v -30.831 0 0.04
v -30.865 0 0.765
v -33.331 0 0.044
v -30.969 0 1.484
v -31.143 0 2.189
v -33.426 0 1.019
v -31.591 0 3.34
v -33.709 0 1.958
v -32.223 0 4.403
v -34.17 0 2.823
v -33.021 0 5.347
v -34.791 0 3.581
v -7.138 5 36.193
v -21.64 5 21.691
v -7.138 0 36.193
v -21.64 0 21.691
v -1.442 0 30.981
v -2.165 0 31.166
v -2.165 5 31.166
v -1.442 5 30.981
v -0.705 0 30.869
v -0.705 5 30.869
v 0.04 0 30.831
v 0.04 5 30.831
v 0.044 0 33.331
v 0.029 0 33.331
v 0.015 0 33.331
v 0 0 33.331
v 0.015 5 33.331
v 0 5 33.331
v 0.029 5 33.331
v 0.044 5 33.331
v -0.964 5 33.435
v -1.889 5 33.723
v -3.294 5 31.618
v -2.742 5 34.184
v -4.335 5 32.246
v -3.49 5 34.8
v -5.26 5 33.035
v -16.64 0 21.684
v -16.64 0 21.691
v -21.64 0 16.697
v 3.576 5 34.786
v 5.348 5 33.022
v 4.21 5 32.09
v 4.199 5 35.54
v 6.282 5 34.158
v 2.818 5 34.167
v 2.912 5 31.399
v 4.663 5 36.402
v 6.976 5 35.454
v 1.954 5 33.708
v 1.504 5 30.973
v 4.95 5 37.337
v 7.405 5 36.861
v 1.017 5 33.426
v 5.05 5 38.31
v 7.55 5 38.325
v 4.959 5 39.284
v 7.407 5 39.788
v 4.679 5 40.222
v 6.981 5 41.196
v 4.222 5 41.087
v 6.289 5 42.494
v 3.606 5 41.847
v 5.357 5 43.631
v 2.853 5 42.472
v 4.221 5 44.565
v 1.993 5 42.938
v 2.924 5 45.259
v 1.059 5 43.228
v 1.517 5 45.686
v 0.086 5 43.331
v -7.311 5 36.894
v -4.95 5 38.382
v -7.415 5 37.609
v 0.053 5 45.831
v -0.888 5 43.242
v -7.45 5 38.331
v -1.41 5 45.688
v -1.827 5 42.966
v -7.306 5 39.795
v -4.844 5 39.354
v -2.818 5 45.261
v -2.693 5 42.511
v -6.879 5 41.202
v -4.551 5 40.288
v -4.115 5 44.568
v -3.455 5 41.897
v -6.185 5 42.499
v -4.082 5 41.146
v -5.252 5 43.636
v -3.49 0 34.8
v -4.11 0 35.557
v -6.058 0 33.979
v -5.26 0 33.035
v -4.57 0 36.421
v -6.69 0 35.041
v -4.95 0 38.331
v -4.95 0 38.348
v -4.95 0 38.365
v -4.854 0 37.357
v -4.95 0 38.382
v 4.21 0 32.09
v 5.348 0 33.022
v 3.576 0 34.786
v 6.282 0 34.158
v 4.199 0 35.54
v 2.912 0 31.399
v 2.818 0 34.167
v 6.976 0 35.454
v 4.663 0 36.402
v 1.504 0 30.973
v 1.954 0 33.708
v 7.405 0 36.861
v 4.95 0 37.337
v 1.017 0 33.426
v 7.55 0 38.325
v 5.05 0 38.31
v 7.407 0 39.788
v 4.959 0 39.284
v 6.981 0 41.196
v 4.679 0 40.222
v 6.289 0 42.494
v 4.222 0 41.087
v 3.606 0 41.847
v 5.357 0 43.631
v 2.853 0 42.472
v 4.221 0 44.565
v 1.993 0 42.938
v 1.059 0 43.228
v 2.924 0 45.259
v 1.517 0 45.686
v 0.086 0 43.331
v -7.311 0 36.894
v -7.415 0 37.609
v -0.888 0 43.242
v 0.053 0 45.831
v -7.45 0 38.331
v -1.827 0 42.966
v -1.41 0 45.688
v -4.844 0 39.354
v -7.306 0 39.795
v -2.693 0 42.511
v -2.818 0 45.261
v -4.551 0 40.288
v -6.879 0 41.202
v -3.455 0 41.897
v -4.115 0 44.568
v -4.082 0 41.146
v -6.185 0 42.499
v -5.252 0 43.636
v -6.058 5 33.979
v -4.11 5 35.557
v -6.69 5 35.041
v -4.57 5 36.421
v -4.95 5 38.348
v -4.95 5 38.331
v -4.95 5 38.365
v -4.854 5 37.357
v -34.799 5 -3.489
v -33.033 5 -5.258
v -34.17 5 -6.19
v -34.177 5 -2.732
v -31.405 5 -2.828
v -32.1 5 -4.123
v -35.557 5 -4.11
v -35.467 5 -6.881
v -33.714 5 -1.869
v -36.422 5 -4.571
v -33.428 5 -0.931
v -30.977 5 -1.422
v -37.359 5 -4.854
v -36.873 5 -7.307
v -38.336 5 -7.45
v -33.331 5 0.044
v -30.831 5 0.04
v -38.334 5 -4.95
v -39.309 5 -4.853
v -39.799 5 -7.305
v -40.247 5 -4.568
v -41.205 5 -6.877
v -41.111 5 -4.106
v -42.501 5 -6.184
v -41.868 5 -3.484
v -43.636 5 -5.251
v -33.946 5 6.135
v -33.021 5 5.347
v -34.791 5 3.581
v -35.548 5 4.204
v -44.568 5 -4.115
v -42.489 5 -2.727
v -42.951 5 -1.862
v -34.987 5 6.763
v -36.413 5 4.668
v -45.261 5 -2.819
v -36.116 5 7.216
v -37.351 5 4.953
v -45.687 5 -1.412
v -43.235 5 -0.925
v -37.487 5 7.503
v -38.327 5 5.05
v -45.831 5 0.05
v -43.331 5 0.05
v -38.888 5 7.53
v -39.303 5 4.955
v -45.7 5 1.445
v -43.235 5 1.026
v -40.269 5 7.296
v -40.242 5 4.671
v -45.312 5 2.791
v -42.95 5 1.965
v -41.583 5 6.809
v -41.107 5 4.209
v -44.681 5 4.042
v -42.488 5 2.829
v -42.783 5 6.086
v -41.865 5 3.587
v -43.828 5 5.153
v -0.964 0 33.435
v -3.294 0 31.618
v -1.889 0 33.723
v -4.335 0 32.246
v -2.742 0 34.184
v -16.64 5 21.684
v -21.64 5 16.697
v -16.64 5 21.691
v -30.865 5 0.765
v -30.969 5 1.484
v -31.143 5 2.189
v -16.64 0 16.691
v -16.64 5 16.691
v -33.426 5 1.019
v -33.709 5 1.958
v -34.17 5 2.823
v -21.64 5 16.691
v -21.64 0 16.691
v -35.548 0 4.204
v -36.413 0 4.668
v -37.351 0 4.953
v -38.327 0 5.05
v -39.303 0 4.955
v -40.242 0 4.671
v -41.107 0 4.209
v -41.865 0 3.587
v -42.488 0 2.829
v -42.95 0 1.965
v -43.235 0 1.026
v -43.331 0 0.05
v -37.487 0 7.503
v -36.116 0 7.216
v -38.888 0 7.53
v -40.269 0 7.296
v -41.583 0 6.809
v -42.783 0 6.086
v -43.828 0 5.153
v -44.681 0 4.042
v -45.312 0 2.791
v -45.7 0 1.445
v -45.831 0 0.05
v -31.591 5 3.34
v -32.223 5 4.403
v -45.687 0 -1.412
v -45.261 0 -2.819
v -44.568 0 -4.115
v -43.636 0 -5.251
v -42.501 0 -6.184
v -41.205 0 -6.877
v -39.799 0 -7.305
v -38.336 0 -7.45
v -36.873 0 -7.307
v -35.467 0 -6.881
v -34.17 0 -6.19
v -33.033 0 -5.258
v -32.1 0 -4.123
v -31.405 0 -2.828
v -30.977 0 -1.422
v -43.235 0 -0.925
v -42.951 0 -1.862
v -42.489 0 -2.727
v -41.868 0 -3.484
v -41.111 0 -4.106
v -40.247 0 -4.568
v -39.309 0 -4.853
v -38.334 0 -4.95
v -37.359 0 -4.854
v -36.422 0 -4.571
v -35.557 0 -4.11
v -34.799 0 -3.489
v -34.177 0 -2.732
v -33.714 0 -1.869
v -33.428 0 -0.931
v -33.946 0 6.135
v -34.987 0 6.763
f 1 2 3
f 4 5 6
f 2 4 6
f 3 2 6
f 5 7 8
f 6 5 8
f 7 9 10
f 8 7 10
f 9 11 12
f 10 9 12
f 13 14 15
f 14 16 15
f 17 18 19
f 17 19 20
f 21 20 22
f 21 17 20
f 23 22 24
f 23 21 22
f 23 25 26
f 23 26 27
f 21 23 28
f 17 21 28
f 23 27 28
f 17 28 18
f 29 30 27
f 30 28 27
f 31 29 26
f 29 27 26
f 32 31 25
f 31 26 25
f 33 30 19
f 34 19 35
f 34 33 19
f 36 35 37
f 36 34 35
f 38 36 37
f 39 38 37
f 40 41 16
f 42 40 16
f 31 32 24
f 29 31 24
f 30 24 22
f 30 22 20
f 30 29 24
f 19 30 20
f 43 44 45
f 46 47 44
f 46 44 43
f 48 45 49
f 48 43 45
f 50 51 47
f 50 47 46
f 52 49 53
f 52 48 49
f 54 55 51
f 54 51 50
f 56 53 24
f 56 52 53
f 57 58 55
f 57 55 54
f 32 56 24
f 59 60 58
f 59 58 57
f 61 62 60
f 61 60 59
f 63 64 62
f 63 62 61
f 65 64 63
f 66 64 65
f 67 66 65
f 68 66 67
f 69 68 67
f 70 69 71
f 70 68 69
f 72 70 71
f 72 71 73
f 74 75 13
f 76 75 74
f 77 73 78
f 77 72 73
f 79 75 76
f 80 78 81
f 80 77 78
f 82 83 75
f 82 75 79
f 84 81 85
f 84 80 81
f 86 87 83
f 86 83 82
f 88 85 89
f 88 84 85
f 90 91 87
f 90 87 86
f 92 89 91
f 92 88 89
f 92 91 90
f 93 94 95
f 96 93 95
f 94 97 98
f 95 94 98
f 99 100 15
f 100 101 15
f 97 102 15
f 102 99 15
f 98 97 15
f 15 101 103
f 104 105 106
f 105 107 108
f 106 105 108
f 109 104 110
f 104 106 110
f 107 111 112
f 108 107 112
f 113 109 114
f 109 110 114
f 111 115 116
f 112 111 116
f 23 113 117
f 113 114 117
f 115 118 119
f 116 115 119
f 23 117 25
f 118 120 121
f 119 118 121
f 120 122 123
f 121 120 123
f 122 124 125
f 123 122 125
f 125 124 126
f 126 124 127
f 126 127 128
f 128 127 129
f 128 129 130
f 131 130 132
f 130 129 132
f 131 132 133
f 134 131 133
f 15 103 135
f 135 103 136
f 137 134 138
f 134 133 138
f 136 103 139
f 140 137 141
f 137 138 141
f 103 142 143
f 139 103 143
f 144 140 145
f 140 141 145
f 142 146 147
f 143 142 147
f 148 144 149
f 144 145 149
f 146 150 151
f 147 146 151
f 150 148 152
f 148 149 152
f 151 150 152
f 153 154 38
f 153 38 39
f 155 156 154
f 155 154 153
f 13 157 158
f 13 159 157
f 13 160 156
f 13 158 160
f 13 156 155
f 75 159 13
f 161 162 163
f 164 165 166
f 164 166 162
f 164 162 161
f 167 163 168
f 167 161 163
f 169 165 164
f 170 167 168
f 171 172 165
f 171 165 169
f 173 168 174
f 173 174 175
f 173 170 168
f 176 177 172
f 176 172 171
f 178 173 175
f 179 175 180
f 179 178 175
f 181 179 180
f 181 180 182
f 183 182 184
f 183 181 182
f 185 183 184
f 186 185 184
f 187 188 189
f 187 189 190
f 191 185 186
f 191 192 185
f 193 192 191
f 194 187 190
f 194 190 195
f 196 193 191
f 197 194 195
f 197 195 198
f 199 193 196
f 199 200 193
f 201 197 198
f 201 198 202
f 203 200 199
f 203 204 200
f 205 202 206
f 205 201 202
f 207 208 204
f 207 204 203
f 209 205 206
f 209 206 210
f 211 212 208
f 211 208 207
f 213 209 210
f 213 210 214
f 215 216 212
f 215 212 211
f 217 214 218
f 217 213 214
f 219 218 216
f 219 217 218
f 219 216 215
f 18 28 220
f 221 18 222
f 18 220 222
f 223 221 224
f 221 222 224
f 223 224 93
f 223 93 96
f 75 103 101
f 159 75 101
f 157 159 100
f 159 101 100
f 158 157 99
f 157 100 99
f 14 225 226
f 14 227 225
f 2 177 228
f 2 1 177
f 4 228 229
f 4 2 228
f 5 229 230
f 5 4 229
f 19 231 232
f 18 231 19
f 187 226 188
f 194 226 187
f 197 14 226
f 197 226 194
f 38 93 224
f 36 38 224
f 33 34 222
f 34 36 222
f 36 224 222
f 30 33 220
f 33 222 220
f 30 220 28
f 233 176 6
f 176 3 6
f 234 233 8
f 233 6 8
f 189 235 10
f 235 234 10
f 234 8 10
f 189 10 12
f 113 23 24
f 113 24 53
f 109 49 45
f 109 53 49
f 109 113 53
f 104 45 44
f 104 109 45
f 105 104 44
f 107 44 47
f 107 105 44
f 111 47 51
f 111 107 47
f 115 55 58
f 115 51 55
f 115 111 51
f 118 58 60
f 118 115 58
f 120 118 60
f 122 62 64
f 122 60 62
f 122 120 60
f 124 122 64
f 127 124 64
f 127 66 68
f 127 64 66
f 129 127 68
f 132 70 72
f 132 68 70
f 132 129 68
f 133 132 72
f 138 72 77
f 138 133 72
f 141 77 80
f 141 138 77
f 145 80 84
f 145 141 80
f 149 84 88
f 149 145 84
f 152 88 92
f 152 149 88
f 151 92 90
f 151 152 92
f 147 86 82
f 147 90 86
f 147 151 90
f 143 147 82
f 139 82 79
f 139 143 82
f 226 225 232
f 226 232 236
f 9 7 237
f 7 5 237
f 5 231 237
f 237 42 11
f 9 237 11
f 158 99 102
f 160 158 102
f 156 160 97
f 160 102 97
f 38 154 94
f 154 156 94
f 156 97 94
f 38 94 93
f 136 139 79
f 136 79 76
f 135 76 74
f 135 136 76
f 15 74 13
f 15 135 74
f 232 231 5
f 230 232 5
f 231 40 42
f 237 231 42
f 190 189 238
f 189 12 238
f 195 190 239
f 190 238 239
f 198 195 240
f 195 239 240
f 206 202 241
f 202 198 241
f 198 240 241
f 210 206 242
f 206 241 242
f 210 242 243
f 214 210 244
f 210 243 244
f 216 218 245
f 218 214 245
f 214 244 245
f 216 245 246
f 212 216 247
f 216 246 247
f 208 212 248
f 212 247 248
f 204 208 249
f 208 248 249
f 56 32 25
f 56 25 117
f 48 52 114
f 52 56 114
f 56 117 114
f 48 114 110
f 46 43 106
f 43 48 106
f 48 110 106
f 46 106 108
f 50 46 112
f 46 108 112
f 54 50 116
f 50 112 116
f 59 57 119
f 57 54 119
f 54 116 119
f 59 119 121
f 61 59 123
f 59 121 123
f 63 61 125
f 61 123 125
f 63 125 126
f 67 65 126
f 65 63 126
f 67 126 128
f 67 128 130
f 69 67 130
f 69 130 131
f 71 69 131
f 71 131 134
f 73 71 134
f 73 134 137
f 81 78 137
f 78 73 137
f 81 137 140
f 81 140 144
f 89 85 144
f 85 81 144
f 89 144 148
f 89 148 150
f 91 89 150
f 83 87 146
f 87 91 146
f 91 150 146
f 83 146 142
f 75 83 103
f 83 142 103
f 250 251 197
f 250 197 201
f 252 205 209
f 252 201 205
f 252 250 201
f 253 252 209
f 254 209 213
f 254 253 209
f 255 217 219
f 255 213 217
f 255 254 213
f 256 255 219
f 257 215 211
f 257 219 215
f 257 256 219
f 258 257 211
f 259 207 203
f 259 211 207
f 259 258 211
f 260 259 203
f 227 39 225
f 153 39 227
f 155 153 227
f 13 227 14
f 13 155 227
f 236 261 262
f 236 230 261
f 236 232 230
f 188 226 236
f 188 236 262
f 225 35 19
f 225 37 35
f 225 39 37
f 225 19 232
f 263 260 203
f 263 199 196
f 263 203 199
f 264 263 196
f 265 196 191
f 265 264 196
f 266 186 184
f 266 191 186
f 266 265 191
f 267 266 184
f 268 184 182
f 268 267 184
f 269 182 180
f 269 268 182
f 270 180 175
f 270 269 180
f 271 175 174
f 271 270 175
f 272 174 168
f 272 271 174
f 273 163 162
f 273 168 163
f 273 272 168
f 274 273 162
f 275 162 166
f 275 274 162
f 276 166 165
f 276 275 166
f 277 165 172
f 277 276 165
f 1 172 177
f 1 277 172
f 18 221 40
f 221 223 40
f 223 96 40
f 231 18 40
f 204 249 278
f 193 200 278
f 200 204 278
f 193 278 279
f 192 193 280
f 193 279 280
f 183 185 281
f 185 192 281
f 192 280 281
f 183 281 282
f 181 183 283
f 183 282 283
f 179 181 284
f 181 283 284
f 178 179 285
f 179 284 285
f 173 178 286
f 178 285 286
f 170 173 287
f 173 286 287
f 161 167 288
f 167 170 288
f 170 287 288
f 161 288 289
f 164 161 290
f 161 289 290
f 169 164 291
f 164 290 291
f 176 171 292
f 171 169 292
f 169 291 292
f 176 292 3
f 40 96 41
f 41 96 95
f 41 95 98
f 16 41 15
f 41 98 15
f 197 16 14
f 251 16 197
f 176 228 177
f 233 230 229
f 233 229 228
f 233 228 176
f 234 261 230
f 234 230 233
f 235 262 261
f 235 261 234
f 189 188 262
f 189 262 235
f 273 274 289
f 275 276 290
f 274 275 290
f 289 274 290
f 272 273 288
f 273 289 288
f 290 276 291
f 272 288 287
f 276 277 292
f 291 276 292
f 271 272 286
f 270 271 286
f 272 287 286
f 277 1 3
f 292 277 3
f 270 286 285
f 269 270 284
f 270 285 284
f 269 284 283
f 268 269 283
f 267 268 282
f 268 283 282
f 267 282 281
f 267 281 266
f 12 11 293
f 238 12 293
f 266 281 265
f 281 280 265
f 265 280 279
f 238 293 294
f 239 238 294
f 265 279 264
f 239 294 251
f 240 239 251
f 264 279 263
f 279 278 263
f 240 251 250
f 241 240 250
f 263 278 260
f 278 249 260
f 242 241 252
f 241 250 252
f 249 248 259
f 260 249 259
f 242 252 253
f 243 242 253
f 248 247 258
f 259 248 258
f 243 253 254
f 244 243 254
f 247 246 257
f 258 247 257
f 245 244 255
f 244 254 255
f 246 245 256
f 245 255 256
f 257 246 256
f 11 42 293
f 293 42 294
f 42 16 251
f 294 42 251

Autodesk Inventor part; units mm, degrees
ref_plane "YZ Plane" through (0, 0, 0) normal (1, 0, 0) x (0, 1, 0)
ref_plane "XZ Plane" through (0, 0, 0) normal (0, 1, 0) x (-1, 0, 0)
ref_plane "XY Plane" through (0, 0, 0) normal (0, 0, 1) x (1, 0, 0)
sketch "Sketch1" plane through (0, 0, 0) normal (0, 1, 0) x (-1, 0, 0)
  circle A0 centre (-0.0502, 38.3312) radius 4.925
  line L0 (-0.0502, 38.3312) -> (0, 0)
  circle A1 centre (38.3312, 0.0502) radius 4.925
  line L1 (38.3312, 0.0502) -> (0, 0)
  circle A2 centre (38.3312, 0.0502) radius 5
  circle A3 centre (-0.0502, 38.3312) radius 5
  circle A4 centre (-0.0502, 38.3312) radius 7.5
  circle A5 centre (38.3312, 0.0502) radius 7.5
  line L2 (38.3312, 0.0502) -> (-0.0502, 38.3312)
  line L3 (21.6405, 21.6907) -> (16.6405, 21.6907)
  line L4 (16.6405, 21.6907) -> (16.6405, 16.6907)
  line L5 (16.6405, 16.6907) -> (21.6405, 16.6907)
  line L6 (21.6405, 16.6907) -> (21.6405, 21.6907)
  line L7 (21.6405, 21.6907) -> (16.6405, 16.6907) construction
  line L8 (16.6405, 21.6907) -> (21.6405, 16.6907) construction
  line L9 (21.6405, 21.6907) -> (2.4716, 40.8596)
  line L10 (21.6405, 21.6907) -> (37.3312, 6)
  line L11 (16.6405, 16.6907) -> (-2.5284, 35.8596)
  line L12 (16.6405, 16.6907) -> (32.3312, 1)
  point P0 (0, 0)
  point P1 (0, 0)
  point P2 (19.1405, 19.1907)
  point P3 (36.1157, 7.2155)
  point P4 (7.1385, 36.1927)
  point P5 (2.1653, 31.1659)
  point P6 (31.1425, 2.1887)
  dimension "d0" = 10
  dimension "d1" = 10
  dimension "d2" = 15
  dimension "d3" = 15
  dimension "d4" = 5
  dimension "d5" = 5
extrude "Extrusion1" add sketch "Sketch1" along normal blind 5 contours L9 A4 L2 A3 | A3 L0 A4 L9 | L2 A4 L11 A3 | A3 L11 A4 L0 | L9 L3 L4 L2 A4 | L2 L4 L11 A4 | L6 L2 L4 L3 | L10 A5 L2 L6 | L2 L6 L5 L4 | L2 A5 L12 L5 L6 | A5 L1 A2 L2 | A5 L2 A2 L1
properties part number "Pillar_corner_v2"
